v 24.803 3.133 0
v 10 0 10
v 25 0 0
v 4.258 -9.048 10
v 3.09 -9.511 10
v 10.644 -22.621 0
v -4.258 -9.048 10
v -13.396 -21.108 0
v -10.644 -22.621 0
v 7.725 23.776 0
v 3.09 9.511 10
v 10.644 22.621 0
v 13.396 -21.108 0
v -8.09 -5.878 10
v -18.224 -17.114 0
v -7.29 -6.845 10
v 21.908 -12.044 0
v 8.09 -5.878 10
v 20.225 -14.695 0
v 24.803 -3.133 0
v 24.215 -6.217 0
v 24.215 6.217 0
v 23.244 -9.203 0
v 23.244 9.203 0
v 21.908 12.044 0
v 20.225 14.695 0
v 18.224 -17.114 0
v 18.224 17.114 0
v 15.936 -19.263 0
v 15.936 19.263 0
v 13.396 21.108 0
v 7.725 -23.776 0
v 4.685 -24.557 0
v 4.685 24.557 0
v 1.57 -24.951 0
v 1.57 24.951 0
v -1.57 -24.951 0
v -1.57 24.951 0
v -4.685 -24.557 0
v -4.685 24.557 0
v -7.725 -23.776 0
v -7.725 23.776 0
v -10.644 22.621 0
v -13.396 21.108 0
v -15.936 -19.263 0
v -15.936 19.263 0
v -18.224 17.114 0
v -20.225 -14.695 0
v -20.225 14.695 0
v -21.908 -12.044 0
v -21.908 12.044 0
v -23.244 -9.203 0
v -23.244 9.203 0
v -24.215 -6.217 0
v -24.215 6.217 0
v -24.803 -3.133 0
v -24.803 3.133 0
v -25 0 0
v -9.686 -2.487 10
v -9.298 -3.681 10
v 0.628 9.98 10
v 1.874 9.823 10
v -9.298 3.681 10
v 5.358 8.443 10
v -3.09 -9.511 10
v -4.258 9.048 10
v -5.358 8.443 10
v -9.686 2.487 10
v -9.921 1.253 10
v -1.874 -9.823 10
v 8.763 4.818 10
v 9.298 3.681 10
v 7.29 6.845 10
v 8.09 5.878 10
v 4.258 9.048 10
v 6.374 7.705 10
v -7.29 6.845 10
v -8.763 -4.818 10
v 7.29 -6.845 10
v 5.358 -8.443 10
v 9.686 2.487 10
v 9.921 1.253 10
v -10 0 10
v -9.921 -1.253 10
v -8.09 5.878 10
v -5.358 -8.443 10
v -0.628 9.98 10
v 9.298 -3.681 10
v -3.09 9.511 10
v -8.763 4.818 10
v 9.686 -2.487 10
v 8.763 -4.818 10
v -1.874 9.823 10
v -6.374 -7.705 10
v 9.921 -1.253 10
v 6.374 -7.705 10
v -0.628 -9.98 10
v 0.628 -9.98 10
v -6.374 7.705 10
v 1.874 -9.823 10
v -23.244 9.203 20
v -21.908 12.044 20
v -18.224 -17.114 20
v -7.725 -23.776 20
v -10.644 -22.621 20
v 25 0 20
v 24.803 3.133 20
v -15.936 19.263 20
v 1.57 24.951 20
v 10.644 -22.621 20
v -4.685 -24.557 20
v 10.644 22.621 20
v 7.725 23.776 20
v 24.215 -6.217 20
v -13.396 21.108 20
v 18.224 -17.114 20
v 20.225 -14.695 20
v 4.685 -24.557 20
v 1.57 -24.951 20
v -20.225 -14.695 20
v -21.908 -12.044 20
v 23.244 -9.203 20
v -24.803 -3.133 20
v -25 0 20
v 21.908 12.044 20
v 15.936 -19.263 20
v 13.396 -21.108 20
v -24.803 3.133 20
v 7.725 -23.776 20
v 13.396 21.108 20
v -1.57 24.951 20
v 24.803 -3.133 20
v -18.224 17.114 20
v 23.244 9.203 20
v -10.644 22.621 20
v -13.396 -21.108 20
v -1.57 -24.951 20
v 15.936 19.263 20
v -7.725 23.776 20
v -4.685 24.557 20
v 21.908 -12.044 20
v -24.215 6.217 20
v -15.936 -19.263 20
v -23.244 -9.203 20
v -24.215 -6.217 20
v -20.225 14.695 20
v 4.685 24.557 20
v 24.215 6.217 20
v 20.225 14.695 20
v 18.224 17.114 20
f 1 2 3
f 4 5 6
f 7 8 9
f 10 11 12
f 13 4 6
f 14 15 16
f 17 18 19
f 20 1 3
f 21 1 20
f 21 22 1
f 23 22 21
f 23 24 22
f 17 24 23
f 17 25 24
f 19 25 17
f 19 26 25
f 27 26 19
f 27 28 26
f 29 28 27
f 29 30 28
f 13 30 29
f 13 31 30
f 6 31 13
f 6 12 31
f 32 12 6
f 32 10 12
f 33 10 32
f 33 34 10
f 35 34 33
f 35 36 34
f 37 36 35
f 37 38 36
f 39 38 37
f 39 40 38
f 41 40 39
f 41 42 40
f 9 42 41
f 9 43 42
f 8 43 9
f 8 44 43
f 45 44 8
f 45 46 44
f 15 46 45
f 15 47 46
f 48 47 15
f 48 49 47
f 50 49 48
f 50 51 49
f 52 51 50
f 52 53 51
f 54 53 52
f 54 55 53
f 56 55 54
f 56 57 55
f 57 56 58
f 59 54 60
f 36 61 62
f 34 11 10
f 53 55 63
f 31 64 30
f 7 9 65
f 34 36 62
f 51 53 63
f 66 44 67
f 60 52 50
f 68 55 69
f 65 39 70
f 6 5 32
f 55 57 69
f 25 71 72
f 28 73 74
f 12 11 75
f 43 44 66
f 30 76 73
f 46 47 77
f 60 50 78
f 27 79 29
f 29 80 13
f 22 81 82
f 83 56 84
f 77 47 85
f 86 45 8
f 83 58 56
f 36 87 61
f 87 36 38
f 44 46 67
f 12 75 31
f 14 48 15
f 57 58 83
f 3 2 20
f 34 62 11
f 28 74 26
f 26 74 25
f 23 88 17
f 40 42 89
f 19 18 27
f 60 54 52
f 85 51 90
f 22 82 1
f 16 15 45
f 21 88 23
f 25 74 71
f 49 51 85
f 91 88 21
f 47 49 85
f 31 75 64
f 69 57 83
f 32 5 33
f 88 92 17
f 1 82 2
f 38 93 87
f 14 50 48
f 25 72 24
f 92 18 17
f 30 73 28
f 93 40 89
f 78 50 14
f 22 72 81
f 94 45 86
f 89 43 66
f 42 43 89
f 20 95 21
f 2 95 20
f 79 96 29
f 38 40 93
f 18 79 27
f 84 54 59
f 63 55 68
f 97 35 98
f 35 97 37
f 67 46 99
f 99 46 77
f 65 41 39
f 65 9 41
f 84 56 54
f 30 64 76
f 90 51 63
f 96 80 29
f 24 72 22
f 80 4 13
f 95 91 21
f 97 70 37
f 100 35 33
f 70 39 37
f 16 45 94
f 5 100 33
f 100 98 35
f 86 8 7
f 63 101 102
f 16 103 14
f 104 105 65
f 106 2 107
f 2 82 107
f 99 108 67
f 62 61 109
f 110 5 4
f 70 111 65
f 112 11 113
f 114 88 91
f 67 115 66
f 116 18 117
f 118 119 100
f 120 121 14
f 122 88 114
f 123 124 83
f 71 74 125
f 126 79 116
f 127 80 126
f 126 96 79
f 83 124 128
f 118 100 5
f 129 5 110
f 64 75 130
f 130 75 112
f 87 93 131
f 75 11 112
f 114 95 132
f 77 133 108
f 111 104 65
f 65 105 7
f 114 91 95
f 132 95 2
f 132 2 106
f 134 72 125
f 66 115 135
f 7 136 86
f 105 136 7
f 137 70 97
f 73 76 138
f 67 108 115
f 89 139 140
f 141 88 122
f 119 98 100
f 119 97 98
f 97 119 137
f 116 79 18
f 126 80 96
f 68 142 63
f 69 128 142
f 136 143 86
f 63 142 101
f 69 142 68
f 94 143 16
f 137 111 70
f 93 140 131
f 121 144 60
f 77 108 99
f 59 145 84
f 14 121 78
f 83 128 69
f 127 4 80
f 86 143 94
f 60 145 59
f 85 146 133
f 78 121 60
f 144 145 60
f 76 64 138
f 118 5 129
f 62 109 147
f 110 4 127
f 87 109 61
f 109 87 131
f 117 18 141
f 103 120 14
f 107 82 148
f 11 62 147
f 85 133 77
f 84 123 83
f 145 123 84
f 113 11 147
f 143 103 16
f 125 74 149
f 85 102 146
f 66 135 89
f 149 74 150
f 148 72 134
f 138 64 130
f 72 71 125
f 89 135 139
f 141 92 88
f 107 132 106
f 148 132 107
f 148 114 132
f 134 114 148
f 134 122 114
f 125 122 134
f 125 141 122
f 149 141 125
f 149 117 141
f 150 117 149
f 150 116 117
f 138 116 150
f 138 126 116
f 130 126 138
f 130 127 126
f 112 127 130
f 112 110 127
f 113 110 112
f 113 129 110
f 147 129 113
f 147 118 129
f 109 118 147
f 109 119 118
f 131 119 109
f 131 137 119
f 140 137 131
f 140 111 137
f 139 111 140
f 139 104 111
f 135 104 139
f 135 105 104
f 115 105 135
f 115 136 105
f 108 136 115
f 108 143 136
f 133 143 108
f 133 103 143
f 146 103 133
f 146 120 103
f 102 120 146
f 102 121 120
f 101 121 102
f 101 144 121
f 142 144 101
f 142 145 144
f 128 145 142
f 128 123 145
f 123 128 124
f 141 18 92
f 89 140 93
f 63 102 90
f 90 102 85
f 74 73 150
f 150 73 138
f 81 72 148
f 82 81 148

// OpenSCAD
$fn = 50;

height = 10;
r_outer = 25;
r_inner = 10;

union() {
    cylinder(h=height, r1=r_outer, r2=r_inner);
    translate([0, 0, height]) cylinder(h=height, r1=r_inner, r2=r_outer);
}
